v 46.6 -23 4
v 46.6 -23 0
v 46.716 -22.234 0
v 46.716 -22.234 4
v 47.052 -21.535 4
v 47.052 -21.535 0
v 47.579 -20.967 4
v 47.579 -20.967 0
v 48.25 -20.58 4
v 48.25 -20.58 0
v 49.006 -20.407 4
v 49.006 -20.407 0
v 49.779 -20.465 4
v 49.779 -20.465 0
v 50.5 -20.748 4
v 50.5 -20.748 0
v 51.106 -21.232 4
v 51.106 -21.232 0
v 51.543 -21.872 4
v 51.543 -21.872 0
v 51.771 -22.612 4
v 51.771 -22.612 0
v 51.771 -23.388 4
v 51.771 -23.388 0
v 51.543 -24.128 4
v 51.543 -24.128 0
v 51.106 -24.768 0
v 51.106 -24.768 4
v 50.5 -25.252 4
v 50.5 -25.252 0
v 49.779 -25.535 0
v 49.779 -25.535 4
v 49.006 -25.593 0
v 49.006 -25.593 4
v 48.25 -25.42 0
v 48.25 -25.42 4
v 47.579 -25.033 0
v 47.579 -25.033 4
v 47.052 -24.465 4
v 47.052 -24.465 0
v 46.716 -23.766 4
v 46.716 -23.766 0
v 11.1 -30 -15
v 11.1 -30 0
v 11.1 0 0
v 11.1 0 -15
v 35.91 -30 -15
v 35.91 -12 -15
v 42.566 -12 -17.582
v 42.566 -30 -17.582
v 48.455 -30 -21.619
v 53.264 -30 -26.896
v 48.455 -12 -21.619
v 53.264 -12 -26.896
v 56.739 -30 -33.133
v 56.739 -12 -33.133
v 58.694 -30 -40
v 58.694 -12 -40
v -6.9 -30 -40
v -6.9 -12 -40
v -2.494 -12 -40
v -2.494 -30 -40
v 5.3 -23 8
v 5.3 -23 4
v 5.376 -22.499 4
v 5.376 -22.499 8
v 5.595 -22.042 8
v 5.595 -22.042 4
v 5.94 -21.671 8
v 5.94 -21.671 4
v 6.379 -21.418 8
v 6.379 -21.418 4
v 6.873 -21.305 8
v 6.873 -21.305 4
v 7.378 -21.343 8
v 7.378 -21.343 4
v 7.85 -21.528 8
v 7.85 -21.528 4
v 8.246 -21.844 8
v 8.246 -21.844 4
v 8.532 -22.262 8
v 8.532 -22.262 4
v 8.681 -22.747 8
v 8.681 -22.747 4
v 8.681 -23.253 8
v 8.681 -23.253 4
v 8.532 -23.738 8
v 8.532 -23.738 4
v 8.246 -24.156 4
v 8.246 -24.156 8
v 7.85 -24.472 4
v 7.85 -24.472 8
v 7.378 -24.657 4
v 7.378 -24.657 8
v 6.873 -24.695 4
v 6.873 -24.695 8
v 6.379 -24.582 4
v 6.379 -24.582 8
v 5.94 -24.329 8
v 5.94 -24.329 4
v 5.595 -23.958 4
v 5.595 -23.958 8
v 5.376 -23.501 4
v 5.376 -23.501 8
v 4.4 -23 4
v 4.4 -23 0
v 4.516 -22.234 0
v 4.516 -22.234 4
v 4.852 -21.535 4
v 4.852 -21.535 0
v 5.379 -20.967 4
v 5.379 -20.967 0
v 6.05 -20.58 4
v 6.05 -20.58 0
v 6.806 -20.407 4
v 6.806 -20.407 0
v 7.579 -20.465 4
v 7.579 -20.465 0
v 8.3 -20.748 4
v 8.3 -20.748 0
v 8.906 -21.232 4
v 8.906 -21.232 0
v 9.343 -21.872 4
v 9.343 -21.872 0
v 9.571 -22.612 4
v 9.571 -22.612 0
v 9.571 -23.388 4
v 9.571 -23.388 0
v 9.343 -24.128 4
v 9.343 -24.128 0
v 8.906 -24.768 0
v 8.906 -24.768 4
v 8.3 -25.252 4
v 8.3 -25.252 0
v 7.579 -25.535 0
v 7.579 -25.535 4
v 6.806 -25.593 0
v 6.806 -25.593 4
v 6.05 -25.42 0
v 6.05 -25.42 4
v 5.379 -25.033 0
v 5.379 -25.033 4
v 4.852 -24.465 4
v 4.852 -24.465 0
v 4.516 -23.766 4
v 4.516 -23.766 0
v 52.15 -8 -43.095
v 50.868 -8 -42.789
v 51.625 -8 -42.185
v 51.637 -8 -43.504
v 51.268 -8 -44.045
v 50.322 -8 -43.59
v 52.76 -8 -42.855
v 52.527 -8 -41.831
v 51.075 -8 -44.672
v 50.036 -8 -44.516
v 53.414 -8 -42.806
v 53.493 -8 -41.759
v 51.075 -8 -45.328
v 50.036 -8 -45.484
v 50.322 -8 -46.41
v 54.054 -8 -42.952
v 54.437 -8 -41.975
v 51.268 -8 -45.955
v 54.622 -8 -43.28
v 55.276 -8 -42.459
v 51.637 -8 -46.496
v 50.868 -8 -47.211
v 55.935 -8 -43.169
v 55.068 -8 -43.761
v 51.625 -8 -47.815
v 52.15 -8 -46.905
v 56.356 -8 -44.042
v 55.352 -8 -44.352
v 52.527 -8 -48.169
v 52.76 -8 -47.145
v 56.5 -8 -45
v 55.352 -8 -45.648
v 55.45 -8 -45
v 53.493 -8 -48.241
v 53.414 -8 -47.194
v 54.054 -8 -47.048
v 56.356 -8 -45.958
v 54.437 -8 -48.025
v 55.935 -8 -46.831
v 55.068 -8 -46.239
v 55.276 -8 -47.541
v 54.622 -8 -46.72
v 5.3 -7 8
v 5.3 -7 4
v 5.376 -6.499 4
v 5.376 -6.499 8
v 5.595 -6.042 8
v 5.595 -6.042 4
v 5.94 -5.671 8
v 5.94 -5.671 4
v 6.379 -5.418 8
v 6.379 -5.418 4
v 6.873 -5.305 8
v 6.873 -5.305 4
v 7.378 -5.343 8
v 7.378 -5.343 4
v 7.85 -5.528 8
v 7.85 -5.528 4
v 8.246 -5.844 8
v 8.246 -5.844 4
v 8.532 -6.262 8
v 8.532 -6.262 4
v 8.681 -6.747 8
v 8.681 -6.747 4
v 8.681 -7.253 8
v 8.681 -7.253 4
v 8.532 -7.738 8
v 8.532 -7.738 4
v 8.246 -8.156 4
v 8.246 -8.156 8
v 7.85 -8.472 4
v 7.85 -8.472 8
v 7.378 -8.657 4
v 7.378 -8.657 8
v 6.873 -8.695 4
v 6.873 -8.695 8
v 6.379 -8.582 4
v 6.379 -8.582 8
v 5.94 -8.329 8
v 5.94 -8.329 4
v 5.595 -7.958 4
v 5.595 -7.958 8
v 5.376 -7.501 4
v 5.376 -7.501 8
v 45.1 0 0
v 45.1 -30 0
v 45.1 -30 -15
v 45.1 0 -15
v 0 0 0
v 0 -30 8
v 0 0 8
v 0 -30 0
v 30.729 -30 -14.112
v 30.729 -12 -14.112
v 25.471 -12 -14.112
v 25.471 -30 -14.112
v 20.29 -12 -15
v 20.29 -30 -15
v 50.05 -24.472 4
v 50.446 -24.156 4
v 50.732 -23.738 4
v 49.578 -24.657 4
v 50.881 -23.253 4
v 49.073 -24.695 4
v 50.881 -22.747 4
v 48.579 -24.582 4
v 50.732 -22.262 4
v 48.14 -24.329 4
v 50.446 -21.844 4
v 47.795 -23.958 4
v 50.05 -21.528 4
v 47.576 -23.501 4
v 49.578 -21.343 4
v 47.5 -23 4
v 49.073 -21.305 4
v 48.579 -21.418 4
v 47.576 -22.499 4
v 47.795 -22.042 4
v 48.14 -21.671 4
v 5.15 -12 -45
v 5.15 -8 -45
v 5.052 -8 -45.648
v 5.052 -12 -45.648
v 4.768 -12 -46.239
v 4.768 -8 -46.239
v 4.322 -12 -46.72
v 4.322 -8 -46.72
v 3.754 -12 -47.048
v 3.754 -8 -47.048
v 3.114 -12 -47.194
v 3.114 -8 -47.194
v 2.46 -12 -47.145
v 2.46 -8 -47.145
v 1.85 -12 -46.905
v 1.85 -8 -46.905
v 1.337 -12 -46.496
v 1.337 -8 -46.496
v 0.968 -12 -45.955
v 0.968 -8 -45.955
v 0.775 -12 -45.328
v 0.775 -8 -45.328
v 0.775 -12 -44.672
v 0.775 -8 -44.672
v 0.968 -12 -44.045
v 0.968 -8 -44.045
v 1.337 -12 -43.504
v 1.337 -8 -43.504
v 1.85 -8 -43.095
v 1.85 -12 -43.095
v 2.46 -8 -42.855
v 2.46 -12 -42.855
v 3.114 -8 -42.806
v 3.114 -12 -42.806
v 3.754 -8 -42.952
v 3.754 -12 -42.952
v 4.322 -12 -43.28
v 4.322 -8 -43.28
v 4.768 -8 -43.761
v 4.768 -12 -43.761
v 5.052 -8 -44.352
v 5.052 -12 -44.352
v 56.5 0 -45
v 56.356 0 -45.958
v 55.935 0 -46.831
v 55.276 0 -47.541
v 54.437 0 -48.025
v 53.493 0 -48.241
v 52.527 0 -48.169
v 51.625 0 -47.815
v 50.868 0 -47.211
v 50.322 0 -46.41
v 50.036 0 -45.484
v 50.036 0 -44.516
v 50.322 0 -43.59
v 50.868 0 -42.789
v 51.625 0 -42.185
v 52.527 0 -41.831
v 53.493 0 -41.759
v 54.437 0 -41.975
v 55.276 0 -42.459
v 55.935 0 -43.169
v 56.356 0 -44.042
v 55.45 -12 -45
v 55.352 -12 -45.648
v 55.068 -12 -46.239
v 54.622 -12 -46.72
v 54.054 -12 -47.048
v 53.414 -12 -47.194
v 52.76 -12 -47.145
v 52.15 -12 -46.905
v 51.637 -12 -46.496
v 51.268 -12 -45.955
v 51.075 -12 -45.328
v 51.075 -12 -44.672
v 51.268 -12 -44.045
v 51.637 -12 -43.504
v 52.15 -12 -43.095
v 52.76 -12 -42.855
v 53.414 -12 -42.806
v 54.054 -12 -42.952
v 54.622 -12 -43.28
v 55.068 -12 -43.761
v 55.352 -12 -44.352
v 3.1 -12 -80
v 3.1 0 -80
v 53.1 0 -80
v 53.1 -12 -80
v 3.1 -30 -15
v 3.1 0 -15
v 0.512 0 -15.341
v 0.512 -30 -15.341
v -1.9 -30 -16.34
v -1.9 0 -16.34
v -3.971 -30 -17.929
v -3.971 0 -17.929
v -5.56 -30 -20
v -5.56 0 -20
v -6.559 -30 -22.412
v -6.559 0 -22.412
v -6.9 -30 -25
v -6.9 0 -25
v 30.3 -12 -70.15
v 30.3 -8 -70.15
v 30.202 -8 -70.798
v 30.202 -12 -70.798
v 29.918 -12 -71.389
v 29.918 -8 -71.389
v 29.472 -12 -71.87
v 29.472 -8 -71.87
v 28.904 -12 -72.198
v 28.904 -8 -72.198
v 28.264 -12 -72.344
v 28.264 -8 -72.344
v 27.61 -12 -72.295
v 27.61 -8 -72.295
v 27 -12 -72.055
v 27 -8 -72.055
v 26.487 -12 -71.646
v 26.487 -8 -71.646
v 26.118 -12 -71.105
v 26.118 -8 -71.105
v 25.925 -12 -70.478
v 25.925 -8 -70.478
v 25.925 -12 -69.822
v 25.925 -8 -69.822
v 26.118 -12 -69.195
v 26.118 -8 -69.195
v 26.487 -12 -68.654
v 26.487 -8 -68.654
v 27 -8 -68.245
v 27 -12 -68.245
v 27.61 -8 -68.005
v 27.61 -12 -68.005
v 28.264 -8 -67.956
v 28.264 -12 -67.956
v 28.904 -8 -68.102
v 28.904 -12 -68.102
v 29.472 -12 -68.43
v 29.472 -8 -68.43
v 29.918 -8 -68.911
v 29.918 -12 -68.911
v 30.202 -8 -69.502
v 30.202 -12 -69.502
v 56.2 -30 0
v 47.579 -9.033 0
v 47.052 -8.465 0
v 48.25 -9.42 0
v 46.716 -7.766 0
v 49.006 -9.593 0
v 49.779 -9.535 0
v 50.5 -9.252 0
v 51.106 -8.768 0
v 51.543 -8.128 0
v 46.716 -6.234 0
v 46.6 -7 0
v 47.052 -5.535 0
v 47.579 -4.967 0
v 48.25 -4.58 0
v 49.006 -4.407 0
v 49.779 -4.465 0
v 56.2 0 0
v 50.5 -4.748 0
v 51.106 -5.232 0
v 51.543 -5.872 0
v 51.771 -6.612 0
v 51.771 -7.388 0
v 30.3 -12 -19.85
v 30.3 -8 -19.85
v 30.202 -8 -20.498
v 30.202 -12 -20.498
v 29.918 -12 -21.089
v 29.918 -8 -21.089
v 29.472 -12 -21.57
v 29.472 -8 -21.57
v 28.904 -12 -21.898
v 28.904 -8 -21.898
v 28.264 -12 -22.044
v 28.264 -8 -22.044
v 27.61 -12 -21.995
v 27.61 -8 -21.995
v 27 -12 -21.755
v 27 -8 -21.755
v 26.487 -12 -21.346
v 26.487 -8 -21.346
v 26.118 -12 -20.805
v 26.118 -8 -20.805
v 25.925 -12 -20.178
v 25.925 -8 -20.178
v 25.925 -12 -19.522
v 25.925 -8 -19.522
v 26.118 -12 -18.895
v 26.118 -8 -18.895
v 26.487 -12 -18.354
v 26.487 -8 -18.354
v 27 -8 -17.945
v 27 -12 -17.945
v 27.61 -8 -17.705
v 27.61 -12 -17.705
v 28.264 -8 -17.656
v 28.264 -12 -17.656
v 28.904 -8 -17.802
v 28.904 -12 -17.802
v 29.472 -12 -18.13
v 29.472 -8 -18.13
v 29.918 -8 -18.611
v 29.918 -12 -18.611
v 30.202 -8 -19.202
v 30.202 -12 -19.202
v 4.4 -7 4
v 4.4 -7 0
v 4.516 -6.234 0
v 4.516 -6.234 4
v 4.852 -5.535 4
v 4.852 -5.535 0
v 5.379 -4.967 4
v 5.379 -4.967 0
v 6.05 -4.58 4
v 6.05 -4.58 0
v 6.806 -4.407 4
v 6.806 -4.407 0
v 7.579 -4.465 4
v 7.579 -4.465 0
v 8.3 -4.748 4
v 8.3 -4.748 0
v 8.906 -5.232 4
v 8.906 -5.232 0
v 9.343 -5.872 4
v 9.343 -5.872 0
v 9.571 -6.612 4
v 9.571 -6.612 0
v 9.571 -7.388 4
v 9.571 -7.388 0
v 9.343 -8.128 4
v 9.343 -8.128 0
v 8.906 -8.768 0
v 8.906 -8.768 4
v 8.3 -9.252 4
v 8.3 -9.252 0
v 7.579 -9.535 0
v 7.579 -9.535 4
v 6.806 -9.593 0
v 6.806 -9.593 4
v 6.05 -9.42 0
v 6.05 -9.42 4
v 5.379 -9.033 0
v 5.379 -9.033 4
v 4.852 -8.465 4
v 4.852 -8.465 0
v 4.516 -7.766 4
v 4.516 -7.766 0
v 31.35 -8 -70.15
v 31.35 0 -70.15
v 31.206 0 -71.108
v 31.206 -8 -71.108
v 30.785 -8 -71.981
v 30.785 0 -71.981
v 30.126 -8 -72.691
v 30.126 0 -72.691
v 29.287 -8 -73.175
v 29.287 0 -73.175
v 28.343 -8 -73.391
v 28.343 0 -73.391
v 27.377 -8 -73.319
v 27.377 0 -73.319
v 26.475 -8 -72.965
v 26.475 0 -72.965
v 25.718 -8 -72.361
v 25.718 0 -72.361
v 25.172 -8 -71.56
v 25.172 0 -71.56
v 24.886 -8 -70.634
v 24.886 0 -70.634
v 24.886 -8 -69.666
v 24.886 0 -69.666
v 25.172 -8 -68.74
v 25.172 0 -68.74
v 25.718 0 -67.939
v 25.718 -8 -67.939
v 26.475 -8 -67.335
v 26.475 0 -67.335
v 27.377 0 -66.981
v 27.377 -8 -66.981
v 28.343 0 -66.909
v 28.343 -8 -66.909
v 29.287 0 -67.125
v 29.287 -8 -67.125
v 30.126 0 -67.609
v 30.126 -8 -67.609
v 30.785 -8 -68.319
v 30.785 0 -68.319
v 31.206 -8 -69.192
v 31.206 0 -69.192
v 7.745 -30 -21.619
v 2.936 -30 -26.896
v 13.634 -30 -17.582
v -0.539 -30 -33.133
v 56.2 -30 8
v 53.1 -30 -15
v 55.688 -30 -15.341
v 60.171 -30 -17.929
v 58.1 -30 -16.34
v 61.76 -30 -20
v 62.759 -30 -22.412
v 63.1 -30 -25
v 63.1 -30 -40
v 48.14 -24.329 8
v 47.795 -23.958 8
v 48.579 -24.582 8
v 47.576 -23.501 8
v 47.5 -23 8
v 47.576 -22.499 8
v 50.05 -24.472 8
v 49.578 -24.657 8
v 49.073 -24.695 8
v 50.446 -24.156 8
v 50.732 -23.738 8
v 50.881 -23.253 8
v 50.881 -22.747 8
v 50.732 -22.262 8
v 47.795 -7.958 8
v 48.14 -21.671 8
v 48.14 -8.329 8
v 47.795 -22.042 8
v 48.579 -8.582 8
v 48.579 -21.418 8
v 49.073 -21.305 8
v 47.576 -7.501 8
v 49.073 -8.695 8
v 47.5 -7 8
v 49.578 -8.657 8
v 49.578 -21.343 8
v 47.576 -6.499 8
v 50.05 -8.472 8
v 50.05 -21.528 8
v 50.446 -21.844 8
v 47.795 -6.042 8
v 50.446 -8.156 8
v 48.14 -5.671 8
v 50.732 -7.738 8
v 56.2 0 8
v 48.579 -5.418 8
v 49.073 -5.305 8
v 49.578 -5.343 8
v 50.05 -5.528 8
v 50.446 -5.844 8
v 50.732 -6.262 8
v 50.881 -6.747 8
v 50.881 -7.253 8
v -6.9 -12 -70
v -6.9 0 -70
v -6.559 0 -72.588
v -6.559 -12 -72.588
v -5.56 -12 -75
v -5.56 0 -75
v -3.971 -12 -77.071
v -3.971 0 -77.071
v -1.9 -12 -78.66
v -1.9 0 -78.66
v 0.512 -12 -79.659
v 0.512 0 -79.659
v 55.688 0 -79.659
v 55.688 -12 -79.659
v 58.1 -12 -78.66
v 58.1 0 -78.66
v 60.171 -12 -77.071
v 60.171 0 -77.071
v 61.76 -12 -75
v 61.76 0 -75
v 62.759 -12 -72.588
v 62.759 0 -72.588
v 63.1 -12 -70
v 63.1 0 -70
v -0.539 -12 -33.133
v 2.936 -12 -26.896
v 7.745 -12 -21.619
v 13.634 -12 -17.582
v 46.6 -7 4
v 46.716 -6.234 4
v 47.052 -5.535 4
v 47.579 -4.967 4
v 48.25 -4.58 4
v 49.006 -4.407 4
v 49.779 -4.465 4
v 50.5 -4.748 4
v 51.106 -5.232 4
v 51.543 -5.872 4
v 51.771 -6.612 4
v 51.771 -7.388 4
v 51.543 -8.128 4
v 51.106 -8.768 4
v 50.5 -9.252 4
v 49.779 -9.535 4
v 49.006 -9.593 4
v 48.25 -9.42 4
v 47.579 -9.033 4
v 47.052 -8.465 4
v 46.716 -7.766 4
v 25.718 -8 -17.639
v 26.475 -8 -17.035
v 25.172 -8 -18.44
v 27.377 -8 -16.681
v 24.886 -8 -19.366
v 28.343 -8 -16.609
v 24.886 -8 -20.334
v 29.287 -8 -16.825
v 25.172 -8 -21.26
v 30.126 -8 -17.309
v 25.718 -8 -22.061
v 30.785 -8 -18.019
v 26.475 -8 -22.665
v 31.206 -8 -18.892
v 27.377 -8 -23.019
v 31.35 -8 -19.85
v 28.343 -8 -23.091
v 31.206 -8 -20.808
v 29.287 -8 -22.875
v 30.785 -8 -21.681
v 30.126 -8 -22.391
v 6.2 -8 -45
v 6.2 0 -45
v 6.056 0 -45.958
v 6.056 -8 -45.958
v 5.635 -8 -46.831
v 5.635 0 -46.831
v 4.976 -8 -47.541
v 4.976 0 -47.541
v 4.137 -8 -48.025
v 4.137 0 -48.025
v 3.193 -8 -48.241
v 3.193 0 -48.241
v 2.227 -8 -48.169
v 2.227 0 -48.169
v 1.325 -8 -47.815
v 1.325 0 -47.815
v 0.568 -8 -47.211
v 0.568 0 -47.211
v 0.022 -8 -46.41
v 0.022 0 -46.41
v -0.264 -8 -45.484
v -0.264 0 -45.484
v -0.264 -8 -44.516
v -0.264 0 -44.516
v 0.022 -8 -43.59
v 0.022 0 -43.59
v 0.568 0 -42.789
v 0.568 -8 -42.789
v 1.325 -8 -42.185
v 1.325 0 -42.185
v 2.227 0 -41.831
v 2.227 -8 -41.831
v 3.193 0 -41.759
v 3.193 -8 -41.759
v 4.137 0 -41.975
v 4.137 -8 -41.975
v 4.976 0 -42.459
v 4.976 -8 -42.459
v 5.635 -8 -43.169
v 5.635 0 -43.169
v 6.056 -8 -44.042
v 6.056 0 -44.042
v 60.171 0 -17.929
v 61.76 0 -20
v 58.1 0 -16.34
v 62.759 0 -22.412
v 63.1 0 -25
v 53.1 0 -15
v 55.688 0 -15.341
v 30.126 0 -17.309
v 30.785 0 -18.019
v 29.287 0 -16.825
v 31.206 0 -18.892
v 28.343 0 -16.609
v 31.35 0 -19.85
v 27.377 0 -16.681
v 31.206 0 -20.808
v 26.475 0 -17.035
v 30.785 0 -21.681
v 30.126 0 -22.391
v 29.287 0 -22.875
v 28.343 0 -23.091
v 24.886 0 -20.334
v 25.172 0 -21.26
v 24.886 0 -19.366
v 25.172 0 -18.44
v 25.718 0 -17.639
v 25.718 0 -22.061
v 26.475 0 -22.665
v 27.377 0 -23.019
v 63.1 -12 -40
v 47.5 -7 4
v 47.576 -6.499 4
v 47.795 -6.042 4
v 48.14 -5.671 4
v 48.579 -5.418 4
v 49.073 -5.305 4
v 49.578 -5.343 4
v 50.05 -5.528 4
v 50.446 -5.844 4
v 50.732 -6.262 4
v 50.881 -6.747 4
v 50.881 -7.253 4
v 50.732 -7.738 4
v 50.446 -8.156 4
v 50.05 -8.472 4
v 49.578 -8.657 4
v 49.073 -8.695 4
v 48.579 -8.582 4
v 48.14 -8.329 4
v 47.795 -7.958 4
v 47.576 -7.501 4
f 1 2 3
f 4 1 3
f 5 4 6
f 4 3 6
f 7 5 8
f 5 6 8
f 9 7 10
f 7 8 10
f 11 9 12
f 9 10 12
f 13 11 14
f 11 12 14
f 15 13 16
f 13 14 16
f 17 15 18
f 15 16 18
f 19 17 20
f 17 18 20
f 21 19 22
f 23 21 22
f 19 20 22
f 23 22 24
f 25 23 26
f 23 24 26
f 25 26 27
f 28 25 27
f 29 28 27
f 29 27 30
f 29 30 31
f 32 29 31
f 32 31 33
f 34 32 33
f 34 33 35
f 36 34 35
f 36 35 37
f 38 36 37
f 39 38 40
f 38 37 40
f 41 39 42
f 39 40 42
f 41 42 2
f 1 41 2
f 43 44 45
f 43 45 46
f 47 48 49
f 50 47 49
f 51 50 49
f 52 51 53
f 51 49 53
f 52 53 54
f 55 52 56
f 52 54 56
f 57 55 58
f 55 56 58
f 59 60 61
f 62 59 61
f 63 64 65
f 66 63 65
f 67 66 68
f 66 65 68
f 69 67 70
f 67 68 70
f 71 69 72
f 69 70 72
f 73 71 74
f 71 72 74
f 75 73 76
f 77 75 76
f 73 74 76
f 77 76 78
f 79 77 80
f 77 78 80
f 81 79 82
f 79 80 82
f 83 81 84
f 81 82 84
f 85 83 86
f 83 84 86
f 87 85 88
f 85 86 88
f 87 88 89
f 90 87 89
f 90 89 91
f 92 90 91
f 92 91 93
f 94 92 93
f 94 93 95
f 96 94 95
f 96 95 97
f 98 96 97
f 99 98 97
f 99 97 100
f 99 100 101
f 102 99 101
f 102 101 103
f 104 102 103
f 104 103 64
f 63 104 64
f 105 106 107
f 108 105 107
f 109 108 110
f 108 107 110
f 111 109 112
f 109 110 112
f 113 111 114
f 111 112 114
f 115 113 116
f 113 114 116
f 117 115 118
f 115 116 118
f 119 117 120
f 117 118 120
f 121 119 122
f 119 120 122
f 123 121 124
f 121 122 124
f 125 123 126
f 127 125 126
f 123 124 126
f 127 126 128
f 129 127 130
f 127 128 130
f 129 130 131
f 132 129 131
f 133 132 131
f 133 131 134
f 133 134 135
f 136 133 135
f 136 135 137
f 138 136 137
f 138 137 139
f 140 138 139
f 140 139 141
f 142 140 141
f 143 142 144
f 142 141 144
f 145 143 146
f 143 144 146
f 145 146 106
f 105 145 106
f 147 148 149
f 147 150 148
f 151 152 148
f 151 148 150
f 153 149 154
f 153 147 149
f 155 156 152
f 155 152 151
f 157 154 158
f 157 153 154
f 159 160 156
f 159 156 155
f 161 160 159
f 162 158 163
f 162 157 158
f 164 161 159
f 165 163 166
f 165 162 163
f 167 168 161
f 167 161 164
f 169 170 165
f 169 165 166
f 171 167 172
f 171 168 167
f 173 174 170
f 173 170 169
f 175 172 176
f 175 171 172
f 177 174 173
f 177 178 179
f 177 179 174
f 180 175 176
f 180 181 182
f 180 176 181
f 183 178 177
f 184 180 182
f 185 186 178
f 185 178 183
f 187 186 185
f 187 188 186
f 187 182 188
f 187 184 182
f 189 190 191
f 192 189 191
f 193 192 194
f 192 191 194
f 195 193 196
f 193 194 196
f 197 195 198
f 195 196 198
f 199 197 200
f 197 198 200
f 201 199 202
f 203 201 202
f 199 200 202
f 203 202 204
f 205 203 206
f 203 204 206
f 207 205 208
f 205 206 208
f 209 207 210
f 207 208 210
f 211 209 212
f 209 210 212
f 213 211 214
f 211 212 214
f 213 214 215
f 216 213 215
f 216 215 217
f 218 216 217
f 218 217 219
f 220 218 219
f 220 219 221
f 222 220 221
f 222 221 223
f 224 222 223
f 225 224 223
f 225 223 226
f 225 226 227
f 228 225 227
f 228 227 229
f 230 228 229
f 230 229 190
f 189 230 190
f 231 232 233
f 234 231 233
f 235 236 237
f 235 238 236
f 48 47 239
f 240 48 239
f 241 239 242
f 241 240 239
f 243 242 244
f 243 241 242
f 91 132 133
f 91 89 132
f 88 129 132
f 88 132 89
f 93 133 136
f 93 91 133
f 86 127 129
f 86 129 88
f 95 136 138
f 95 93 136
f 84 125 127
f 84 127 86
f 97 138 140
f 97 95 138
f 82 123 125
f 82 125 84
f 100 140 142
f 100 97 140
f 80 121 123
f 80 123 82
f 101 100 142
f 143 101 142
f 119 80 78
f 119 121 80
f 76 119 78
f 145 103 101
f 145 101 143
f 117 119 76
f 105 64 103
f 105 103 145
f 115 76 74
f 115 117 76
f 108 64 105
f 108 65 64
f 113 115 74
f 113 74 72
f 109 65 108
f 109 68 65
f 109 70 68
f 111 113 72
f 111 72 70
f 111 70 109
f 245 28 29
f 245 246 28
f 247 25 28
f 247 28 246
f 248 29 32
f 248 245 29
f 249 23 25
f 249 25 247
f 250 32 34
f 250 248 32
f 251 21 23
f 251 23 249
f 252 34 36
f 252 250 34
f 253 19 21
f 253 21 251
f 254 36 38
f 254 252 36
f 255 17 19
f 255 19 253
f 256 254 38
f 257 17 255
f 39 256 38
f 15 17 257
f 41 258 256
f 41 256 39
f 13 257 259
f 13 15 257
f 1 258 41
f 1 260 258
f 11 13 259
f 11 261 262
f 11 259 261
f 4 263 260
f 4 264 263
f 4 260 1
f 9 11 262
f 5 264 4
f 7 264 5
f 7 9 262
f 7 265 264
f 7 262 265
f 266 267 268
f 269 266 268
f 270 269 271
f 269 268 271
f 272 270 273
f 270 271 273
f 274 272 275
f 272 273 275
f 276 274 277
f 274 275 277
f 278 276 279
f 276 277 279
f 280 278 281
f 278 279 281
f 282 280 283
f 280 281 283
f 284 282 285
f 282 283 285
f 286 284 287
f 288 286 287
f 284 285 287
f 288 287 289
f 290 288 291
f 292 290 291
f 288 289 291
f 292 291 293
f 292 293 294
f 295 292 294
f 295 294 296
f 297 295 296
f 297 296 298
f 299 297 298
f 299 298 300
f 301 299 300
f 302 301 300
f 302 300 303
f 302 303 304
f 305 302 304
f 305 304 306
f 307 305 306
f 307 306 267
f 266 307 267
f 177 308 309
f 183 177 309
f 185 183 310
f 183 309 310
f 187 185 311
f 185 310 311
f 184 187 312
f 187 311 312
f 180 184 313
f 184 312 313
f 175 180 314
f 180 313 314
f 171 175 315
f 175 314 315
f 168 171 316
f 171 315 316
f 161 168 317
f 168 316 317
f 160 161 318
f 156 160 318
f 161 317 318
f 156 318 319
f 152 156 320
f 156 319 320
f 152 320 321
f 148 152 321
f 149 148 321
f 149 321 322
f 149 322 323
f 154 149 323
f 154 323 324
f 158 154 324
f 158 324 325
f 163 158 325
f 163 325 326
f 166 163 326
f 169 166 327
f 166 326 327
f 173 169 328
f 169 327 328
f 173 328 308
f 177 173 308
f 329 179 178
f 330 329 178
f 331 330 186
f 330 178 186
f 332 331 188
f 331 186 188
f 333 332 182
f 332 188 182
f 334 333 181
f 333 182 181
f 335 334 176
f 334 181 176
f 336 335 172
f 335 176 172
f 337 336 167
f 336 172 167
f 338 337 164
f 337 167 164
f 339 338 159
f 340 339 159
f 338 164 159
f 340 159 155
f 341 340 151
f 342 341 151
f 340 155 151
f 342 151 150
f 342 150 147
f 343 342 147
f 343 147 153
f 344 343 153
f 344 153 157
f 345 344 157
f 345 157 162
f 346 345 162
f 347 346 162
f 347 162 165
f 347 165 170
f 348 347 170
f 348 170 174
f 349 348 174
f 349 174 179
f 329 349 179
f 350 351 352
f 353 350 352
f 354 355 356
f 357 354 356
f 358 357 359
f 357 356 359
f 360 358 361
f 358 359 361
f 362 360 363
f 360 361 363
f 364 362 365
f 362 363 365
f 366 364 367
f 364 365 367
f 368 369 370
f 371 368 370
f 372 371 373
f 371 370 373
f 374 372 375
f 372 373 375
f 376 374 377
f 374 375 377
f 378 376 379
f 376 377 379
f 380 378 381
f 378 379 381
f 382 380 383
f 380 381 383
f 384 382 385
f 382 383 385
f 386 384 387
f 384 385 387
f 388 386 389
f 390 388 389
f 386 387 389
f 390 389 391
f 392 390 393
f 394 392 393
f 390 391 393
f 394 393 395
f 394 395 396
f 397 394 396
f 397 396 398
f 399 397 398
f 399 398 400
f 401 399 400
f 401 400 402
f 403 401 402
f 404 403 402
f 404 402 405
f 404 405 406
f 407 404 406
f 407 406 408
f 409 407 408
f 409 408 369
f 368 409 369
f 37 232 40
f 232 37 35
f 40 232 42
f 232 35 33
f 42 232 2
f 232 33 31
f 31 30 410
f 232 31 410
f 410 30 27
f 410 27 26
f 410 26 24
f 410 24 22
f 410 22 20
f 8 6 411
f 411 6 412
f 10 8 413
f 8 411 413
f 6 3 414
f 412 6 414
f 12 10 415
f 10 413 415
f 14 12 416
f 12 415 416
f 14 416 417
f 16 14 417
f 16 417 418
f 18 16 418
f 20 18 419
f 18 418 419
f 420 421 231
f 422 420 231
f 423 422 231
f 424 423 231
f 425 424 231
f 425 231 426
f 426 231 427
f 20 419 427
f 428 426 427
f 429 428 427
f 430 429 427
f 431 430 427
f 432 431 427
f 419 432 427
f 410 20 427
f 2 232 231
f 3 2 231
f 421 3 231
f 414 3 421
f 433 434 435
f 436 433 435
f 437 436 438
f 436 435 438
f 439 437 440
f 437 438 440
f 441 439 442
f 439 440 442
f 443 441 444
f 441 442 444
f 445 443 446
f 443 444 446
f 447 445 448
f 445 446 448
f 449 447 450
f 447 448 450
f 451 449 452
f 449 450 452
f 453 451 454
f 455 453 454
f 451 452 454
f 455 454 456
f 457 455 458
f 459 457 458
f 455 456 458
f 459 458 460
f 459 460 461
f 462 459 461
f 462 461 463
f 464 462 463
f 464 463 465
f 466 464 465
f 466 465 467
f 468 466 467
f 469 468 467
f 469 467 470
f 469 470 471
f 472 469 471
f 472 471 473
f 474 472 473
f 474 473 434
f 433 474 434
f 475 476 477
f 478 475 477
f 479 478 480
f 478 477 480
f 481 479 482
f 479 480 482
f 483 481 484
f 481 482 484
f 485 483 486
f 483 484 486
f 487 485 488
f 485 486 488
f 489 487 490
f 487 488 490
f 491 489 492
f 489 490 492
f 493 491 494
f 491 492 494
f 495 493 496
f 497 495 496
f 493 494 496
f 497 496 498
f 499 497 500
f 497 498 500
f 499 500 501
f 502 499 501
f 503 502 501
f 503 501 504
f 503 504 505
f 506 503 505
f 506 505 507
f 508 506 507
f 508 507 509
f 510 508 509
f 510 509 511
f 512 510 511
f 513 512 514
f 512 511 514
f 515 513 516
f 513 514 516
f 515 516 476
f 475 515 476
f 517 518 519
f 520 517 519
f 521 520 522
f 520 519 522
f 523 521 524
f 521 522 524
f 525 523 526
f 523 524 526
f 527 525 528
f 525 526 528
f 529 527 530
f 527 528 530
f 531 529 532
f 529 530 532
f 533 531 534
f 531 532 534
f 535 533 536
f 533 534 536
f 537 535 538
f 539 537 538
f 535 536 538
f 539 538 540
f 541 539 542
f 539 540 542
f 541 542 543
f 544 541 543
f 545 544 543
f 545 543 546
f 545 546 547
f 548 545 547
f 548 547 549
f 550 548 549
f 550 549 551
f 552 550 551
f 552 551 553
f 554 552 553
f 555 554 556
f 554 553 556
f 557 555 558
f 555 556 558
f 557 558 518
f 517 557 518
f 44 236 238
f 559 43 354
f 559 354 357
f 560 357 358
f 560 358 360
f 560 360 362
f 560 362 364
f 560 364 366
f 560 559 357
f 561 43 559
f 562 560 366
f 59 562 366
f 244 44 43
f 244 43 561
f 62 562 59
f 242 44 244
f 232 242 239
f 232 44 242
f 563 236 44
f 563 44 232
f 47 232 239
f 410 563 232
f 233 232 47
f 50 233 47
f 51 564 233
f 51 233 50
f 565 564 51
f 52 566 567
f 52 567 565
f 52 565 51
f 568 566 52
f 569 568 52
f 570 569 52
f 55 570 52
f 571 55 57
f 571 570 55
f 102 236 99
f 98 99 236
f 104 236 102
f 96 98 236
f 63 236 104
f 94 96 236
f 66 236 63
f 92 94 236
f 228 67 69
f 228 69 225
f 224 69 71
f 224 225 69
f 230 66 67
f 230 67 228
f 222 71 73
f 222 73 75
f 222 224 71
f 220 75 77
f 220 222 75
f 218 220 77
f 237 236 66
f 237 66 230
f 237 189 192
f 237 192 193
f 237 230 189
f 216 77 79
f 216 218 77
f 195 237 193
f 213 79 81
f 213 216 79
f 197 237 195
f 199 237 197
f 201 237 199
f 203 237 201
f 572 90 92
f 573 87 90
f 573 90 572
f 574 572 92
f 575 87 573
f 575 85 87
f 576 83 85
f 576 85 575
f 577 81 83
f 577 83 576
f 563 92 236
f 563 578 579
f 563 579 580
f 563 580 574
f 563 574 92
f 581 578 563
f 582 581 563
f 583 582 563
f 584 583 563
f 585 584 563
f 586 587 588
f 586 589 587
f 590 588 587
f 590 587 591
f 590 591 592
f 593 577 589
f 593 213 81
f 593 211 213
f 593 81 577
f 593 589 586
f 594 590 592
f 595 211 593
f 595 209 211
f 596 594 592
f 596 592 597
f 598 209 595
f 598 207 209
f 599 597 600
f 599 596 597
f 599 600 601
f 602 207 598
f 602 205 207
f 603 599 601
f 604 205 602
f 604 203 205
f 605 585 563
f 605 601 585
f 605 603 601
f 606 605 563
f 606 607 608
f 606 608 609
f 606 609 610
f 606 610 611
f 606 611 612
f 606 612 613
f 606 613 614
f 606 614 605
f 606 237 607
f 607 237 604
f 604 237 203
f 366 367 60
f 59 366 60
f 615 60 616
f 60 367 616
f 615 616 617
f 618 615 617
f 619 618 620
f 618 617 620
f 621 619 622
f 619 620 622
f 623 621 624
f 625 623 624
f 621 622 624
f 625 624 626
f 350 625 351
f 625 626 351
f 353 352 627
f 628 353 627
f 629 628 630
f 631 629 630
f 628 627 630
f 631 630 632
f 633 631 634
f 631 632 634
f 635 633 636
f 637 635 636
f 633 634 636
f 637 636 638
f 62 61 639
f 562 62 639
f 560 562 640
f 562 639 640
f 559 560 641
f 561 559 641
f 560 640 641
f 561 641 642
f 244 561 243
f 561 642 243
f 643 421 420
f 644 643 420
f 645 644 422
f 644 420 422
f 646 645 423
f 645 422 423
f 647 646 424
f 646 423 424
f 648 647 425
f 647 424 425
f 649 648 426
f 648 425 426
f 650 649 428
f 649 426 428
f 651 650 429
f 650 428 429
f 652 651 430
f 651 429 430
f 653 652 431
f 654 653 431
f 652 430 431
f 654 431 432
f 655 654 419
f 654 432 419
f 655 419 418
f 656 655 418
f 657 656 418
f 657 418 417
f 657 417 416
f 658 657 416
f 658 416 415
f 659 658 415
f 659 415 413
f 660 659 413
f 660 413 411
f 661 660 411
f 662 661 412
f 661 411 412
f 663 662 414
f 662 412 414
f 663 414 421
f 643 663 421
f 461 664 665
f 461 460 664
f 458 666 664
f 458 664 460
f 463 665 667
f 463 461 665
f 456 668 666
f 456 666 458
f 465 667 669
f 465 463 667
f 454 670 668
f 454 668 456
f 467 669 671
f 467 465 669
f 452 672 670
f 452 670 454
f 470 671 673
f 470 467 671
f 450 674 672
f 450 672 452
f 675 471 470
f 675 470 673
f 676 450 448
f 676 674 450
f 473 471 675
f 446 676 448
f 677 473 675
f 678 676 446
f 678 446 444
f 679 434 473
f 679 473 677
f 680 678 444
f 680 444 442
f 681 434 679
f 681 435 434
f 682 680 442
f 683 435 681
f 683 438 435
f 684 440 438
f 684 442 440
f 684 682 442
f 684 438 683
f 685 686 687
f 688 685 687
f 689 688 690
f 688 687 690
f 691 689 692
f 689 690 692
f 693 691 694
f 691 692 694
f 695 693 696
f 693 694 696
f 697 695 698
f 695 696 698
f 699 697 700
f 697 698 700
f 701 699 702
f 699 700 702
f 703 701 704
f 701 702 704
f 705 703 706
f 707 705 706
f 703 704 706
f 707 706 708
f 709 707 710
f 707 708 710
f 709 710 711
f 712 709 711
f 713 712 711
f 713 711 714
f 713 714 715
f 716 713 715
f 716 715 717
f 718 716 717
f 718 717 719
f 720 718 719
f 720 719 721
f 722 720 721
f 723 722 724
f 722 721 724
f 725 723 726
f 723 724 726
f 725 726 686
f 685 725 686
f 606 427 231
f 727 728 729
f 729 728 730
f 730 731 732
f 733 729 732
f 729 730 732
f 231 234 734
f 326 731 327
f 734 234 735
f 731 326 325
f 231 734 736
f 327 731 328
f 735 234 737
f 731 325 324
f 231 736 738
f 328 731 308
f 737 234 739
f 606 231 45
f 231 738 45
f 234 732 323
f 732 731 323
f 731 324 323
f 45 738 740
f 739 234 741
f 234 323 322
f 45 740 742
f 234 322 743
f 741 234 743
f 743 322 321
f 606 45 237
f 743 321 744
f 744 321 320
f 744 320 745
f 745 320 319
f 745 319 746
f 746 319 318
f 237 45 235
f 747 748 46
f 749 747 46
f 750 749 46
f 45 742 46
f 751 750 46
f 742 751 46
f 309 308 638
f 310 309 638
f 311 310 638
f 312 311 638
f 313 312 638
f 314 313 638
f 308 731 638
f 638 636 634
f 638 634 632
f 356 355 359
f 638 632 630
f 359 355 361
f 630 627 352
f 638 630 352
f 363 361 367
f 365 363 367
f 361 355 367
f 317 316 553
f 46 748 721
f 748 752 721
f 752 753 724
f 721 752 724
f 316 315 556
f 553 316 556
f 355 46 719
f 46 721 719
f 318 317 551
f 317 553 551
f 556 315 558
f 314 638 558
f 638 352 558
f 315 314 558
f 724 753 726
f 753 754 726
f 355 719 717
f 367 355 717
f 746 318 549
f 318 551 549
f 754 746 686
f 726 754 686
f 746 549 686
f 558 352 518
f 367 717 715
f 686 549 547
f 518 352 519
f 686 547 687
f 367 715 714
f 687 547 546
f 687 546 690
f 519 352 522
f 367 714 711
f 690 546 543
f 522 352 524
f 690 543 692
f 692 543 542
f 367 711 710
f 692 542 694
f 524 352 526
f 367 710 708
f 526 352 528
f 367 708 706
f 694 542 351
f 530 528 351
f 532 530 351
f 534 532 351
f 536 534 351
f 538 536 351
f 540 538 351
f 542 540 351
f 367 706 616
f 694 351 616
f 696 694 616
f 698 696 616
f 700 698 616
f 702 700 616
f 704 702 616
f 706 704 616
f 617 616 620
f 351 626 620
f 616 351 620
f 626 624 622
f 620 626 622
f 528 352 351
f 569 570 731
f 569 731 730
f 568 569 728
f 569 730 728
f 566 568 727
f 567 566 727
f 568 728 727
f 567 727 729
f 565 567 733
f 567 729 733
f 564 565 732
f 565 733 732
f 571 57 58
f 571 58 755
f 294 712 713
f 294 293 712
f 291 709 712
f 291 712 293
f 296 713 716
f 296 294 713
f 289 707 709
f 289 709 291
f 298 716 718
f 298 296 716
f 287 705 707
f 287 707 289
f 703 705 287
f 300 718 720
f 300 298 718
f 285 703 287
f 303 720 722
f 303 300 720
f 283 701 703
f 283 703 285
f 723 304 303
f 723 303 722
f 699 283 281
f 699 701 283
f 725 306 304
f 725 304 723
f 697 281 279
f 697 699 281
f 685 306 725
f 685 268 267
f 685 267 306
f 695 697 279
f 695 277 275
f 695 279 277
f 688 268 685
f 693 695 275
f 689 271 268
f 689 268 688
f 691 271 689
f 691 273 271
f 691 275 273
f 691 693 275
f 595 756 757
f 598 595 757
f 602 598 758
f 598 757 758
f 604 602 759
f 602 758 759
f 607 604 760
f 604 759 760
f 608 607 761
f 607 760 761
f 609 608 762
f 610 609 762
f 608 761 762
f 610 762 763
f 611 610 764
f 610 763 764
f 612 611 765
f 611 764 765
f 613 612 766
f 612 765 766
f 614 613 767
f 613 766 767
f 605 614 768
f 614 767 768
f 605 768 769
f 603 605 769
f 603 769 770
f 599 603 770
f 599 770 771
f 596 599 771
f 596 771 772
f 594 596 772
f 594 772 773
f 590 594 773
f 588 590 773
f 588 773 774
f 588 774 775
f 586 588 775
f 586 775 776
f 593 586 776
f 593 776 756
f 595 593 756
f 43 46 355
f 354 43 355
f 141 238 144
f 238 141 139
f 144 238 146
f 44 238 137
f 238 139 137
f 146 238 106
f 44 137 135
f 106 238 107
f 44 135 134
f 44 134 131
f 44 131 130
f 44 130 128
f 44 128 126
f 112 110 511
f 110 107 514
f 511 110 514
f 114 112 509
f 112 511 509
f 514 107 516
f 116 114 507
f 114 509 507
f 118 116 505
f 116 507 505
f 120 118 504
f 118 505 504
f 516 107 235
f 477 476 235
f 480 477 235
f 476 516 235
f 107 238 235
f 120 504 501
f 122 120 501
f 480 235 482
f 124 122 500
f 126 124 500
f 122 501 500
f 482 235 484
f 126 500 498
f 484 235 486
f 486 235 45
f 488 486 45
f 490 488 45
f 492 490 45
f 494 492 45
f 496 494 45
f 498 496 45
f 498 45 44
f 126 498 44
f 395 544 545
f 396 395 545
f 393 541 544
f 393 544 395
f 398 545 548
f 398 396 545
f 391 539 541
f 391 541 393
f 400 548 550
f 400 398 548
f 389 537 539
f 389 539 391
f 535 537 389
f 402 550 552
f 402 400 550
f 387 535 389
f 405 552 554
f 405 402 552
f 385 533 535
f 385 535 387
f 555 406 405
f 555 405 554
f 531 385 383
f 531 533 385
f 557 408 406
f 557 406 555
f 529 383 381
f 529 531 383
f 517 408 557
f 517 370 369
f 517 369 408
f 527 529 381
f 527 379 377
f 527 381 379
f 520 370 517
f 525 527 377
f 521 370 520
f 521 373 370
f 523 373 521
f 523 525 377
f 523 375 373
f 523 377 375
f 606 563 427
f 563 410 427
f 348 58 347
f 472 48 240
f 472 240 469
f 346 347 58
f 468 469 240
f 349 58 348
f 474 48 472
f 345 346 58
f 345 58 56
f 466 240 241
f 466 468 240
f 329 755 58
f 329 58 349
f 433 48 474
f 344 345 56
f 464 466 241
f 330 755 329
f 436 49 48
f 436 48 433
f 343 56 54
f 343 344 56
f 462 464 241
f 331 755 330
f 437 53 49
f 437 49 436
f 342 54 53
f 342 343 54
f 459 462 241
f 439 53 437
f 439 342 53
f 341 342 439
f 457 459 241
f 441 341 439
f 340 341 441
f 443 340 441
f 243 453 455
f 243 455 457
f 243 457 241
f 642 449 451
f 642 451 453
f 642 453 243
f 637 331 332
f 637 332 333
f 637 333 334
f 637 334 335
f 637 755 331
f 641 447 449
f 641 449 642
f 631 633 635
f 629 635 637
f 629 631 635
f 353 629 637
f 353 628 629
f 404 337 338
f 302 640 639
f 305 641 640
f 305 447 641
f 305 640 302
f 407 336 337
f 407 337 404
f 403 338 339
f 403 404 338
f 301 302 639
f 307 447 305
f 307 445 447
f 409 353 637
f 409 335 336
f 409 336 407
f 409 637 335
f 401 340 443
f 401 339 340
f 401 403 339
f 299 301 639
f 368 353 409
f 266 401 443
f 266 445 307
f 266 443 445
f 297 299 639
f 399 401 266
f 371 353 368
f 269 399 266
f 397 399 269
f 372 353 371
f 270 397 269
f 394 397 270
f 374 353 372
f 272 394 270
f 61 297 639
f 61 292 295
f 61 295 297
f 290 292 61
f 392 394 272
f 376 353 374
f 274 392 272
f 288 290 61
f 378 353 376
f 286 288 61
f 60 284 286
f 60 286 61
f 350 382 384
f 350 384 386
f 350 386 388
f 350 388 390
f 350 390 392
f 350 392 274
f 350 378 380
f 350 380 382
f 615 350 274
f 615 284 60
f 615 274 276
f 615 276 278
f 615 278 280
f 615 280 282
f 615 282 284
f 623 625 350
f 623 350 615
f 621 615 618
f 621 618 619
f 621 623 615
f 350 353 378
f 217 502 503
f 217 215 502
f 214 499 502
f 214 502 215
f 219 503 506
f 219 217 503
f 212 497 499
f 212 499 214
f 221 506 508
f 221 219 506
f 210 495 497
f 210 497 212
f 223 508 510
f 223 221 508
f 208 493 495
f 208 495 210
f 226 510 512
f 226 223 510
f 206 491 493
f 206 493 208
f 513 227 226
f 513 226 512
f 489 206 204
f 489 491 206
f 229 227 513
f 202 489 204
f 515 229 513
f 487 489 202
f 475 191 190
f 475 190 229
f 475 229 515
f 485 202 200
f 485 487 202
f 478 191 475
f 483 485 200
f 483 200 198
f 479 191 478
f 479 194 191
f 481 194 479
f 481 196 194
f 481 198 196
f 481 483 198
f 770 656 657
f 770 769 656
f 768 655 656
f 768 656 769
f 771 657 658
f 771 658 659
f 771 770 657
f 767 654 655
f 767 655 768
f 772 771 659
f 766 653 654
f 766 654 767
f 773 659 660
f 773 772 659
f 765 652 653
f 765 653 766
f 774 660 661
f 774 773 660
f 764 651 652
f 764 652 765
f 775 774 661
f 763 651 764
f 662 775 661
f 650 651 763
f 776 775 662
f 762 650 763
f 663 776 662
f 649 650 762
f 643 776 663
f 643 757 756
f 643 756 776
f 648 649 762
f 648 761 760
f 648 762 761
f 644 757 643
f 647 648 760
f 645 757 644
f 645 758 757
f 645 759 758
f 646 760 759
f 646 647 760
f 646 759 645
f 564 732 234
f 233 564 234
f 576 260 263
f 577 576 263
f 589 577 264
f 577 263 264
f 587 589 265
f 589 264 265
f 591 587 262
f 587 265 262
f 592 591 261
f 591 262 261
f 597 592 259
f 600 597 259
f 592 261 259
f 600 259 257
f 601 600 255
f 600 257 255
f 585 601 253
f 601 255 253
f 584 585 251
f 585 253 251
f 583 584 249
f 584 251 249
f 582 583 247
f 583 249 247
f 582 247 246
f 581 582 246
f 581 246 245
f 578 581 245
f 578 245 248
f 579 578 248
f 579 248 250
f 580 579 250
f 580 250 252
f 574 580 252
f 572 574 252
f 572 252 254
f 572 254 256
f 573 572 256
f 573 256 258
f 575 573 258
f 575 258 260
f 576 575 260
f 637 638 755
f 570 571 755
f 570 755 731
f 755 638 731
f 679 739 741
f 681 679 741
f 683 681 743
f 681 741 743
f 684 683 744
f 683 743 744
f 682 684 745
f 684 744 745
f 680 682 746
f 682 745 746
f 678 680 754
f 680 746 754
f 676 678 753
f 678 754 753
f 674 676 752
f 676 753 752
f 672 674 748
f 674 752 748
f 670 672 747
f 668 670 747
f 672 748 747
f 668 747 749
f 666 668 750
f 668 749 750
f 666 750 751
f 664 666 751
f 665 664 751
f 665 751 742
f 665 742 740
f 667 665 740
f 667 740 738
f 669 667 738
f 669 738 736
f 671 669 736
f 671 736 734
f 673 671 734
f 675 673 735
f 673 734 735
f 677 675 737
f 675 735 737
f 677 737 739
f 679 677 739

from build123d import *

# Parameters (mm, degrees)
SKETCH1_W                = 56.2
SKETCH1_H                = 30
BOSS_EXTRUDE1_DEPTH      = 5
SKETCH3_W                = 56.2
SKETCH3_H                = 30
BOSS_EXTRUDE2_DEPTH      = 3
SKETCH4_R                = 1.7
CUT_EXTRUDE2_DEPTH       = 8
SKETCH8_R                = 2.6
CUT_EXTRUDE4_DEPTH       = 4
SKETCH9_W                = 15
SKETCH9_H                = 30
BOSS_EXTRUDE5_DEPTH      = 17
BOSS_EXTRUDE5_DEPTH_BACK = 17
BOSS_EXTRUDE6_DEPTH      = 12
SKETCH11_R               = 2.2
CUT_EXTRUDE5_DEPTH       = 12
BOSS_EXTRUDE7_DEPTH      = 18
CUT_EXTRUDE6_DEPTH       = 18
SKETCH14_R               = 3.25
CUT_EXTRUDE7_DEPTH       = 8


with BuildPart() as part:
    # Sketch1 → Boss-Extrude1 (new body)
    with BuildSketch(Plane.XY):
        with Locations((28.1, -15)):
            Rectangle(SKETCH1_W, SKETCH1_H)
    extrude(amount=BOSS_EXTRUDE1_DEPTH)

    # Sketch3 → Boss-Extrude2 (add)
    with BuildSketch(Plane.XY.offset(5)):
        with Locations((28.1, -15)):
            Rectangle(SKETCH3_W, SKETCH3_H)
    extrude(amount=BOSS_EXTRUDE2_DEPTH)

    # Sketch4 → Cut-Extrude2 (cut)
    with BuildSketch(Plane(origin=(0, 0, 0), x_dir=(-1, 0, 0), z_dir=(0, 0, -1))):
        with Locations((-49.2, -7)):
            Circle(SKETCH4_R)
        with Locations((-7, -7)):
            Circle(SKETCH4_R)
        with Locations((-7, -23)):
            Circle(SKETCH4_R)
        with Locations((-49.2, -23)):
            Circle(SKETCH4_R)
    extrude(amount=-CUT_EXTRUDE2_DEPTH, mode=Mode.SUBTRACT)

    # Sketch8 → Cut-Extrude4 (cut)
    with BuildSketch(Plane(origin=(0, 0, 0), x_dir=(-1, 0, 0), z_dir=(0, 0, -1))):
        with Locations((-49.2, -7)):
            Circle(SKETCH8_R)
        with Locations((-7, -7)):
            Circle(SKETCH8_R)
        with Locations((-7, -23)):
            Circle(SKETCH8_R)
        with Locations((-49.2, -23)):
            Circle(SKETCH8_R)
    extrude(amount=-CUT_EXTRUDE4_DEPTH, mode=Mode.SUBTRACT)

    # Sketch9 → Boss-Extrude5 (add, two sides)
    with BuildSketch(Plane(origin=(28.1, 0, 0), x_dir=(0, 0, -1), z_dir=(1, 0, 0))) as boss_extrude5_sk:
        with Locations((7.5, -15)):
            Rectangle(SKETCH9_W, SKETCH9_H)
    extrude(amount=BOSS_EXTRUDE5_DEPTH)
    extrude(boss_extrude5_sk.sketch, amount=-BOSS_EXTRUDE5_DEPTH_BACK)

    # Sketch10 → Boss-Extrude6 (add)
    with BuildSketch(Plane(origin=(0, 0, 0), x_dir=(1, 0, 0), z_dir=(0, 1, 0))):
        with BuildLine():
            Line((53.1, 15), (3.1, 15))
            ThreePointArc((3.1, 15), (-3.971068, 17.928932), (-6.9, 25))
            Line((-6.9, 25), (-6.9, 70))
            ThreePointArc((-6.9, 70), (-3.971068, 77.071068), (3.1, 80))
            Line((3.1, 80), (53.1, 80))
            ThreePointArc((53.1, 80), (60.171068, 77.071068), (63.1, 70))
            Line((63.1, 70), (63.1, 25))
            ThreePointArc((63.1, 25), (60.171068, 17.928932), (53.1, 15))
        make_face()
    extrude(amount=-BOSS_EXTRUDE6_DEPTH)

    # Sketch11 → Cut-Extrude5 (cut)
    with BuildSketch(Plane(origin=(0, 0, 0), x_dir=(1, 0, 0), z_dir=(0, 1, 0))):
        with Locations((28.1, 70.15)):
            Circle(SKETCH11_R)
        with Locations((53.25, 45)):
            Circle(SKETCH11_R)
        with Locations((28.1, 19.85)):
            Circle(SKETCH11_R)
        with Locations((2.95, 45)):
            Circle(SKETCH11_R)
    extrude(amount=-CUT_EXTRUDE5_DEPTH, mode=Mode.SUBTRACT)

    # Sketch12 → Boss-Extrude7 (add)
    with BuildSketch(Plane(origin=(0, -12, 0), x_dir=(1, 0, 0), z_dir=(0, 1, 0))):
        with BuildLine():
            Line((45.1, 13), (11.1, 13))
            Line((11.1, 13), (11.1, 15))
            Line((11.1, 15), (3.1, 15))
            ThreePointArc((3.1, 15), (-3.971068, 17.928932), (-6.9, 25))
            Line((-6.9, 25), (-6.9, 40))
            Line((-6.9, 40), (-2.494117, 40))
            ThreePointArc((-2.494117, 40), (28.1, 14), (58.694117, 40))
            Line((58.694117, 40), (63.1, 40))
            Line((63.1, 40), (63.1, 25))
            ThreePointArc((63.1, 25), (60.171068, 17.928932), (53.1, 15))
            Line((53.1, 15), (45.1, 15))
            Line((45.1, 15), (45.1, 13))
        make_face()
    extrude(amount=-BOSS_EXTRUDE7_DEPTH)

    # Sketch13 → Cut-Extrude6 (cut)
    with BuildSketch(Plane(origin=(0, -12, 0), x_dir=(1, 0, 0), z_dir=(0, 1, 0))):
        with BuildLine():
            Line((20.28975, 15), (35.91025, 15))
            ThreePointArc((35.91025, 15), (28.1, 14), (20.28975, 15))
        make_face()
    extrude(amount=-CUT_EXTRUDE6_DEPTH, mode=Mode.SUBTRACT)

    # Sketch14 → Cut-Extrude7 (cut)
    with BuildSketch(Plane(origin=(0, 0, 0), x_dir=(1, 0, 0), z_dir=(0, 1, 0))):
        with Locations((28.1, 70.15)):
            Circle(SKETCH14_R)
        with Locations((53.25, 45)):
            Circle(SKETCH14_R)
        with Locations((28.1, 19.85)):
            Circle(SKETCH14_R)
        with Locations((2.95, 45)):
            Circle(SKETCH14_R)
    extrude(amount=-CUT_EXTRUDE7_DEPTH, mode=Mode.SUBTRACT)


solid = part.part
